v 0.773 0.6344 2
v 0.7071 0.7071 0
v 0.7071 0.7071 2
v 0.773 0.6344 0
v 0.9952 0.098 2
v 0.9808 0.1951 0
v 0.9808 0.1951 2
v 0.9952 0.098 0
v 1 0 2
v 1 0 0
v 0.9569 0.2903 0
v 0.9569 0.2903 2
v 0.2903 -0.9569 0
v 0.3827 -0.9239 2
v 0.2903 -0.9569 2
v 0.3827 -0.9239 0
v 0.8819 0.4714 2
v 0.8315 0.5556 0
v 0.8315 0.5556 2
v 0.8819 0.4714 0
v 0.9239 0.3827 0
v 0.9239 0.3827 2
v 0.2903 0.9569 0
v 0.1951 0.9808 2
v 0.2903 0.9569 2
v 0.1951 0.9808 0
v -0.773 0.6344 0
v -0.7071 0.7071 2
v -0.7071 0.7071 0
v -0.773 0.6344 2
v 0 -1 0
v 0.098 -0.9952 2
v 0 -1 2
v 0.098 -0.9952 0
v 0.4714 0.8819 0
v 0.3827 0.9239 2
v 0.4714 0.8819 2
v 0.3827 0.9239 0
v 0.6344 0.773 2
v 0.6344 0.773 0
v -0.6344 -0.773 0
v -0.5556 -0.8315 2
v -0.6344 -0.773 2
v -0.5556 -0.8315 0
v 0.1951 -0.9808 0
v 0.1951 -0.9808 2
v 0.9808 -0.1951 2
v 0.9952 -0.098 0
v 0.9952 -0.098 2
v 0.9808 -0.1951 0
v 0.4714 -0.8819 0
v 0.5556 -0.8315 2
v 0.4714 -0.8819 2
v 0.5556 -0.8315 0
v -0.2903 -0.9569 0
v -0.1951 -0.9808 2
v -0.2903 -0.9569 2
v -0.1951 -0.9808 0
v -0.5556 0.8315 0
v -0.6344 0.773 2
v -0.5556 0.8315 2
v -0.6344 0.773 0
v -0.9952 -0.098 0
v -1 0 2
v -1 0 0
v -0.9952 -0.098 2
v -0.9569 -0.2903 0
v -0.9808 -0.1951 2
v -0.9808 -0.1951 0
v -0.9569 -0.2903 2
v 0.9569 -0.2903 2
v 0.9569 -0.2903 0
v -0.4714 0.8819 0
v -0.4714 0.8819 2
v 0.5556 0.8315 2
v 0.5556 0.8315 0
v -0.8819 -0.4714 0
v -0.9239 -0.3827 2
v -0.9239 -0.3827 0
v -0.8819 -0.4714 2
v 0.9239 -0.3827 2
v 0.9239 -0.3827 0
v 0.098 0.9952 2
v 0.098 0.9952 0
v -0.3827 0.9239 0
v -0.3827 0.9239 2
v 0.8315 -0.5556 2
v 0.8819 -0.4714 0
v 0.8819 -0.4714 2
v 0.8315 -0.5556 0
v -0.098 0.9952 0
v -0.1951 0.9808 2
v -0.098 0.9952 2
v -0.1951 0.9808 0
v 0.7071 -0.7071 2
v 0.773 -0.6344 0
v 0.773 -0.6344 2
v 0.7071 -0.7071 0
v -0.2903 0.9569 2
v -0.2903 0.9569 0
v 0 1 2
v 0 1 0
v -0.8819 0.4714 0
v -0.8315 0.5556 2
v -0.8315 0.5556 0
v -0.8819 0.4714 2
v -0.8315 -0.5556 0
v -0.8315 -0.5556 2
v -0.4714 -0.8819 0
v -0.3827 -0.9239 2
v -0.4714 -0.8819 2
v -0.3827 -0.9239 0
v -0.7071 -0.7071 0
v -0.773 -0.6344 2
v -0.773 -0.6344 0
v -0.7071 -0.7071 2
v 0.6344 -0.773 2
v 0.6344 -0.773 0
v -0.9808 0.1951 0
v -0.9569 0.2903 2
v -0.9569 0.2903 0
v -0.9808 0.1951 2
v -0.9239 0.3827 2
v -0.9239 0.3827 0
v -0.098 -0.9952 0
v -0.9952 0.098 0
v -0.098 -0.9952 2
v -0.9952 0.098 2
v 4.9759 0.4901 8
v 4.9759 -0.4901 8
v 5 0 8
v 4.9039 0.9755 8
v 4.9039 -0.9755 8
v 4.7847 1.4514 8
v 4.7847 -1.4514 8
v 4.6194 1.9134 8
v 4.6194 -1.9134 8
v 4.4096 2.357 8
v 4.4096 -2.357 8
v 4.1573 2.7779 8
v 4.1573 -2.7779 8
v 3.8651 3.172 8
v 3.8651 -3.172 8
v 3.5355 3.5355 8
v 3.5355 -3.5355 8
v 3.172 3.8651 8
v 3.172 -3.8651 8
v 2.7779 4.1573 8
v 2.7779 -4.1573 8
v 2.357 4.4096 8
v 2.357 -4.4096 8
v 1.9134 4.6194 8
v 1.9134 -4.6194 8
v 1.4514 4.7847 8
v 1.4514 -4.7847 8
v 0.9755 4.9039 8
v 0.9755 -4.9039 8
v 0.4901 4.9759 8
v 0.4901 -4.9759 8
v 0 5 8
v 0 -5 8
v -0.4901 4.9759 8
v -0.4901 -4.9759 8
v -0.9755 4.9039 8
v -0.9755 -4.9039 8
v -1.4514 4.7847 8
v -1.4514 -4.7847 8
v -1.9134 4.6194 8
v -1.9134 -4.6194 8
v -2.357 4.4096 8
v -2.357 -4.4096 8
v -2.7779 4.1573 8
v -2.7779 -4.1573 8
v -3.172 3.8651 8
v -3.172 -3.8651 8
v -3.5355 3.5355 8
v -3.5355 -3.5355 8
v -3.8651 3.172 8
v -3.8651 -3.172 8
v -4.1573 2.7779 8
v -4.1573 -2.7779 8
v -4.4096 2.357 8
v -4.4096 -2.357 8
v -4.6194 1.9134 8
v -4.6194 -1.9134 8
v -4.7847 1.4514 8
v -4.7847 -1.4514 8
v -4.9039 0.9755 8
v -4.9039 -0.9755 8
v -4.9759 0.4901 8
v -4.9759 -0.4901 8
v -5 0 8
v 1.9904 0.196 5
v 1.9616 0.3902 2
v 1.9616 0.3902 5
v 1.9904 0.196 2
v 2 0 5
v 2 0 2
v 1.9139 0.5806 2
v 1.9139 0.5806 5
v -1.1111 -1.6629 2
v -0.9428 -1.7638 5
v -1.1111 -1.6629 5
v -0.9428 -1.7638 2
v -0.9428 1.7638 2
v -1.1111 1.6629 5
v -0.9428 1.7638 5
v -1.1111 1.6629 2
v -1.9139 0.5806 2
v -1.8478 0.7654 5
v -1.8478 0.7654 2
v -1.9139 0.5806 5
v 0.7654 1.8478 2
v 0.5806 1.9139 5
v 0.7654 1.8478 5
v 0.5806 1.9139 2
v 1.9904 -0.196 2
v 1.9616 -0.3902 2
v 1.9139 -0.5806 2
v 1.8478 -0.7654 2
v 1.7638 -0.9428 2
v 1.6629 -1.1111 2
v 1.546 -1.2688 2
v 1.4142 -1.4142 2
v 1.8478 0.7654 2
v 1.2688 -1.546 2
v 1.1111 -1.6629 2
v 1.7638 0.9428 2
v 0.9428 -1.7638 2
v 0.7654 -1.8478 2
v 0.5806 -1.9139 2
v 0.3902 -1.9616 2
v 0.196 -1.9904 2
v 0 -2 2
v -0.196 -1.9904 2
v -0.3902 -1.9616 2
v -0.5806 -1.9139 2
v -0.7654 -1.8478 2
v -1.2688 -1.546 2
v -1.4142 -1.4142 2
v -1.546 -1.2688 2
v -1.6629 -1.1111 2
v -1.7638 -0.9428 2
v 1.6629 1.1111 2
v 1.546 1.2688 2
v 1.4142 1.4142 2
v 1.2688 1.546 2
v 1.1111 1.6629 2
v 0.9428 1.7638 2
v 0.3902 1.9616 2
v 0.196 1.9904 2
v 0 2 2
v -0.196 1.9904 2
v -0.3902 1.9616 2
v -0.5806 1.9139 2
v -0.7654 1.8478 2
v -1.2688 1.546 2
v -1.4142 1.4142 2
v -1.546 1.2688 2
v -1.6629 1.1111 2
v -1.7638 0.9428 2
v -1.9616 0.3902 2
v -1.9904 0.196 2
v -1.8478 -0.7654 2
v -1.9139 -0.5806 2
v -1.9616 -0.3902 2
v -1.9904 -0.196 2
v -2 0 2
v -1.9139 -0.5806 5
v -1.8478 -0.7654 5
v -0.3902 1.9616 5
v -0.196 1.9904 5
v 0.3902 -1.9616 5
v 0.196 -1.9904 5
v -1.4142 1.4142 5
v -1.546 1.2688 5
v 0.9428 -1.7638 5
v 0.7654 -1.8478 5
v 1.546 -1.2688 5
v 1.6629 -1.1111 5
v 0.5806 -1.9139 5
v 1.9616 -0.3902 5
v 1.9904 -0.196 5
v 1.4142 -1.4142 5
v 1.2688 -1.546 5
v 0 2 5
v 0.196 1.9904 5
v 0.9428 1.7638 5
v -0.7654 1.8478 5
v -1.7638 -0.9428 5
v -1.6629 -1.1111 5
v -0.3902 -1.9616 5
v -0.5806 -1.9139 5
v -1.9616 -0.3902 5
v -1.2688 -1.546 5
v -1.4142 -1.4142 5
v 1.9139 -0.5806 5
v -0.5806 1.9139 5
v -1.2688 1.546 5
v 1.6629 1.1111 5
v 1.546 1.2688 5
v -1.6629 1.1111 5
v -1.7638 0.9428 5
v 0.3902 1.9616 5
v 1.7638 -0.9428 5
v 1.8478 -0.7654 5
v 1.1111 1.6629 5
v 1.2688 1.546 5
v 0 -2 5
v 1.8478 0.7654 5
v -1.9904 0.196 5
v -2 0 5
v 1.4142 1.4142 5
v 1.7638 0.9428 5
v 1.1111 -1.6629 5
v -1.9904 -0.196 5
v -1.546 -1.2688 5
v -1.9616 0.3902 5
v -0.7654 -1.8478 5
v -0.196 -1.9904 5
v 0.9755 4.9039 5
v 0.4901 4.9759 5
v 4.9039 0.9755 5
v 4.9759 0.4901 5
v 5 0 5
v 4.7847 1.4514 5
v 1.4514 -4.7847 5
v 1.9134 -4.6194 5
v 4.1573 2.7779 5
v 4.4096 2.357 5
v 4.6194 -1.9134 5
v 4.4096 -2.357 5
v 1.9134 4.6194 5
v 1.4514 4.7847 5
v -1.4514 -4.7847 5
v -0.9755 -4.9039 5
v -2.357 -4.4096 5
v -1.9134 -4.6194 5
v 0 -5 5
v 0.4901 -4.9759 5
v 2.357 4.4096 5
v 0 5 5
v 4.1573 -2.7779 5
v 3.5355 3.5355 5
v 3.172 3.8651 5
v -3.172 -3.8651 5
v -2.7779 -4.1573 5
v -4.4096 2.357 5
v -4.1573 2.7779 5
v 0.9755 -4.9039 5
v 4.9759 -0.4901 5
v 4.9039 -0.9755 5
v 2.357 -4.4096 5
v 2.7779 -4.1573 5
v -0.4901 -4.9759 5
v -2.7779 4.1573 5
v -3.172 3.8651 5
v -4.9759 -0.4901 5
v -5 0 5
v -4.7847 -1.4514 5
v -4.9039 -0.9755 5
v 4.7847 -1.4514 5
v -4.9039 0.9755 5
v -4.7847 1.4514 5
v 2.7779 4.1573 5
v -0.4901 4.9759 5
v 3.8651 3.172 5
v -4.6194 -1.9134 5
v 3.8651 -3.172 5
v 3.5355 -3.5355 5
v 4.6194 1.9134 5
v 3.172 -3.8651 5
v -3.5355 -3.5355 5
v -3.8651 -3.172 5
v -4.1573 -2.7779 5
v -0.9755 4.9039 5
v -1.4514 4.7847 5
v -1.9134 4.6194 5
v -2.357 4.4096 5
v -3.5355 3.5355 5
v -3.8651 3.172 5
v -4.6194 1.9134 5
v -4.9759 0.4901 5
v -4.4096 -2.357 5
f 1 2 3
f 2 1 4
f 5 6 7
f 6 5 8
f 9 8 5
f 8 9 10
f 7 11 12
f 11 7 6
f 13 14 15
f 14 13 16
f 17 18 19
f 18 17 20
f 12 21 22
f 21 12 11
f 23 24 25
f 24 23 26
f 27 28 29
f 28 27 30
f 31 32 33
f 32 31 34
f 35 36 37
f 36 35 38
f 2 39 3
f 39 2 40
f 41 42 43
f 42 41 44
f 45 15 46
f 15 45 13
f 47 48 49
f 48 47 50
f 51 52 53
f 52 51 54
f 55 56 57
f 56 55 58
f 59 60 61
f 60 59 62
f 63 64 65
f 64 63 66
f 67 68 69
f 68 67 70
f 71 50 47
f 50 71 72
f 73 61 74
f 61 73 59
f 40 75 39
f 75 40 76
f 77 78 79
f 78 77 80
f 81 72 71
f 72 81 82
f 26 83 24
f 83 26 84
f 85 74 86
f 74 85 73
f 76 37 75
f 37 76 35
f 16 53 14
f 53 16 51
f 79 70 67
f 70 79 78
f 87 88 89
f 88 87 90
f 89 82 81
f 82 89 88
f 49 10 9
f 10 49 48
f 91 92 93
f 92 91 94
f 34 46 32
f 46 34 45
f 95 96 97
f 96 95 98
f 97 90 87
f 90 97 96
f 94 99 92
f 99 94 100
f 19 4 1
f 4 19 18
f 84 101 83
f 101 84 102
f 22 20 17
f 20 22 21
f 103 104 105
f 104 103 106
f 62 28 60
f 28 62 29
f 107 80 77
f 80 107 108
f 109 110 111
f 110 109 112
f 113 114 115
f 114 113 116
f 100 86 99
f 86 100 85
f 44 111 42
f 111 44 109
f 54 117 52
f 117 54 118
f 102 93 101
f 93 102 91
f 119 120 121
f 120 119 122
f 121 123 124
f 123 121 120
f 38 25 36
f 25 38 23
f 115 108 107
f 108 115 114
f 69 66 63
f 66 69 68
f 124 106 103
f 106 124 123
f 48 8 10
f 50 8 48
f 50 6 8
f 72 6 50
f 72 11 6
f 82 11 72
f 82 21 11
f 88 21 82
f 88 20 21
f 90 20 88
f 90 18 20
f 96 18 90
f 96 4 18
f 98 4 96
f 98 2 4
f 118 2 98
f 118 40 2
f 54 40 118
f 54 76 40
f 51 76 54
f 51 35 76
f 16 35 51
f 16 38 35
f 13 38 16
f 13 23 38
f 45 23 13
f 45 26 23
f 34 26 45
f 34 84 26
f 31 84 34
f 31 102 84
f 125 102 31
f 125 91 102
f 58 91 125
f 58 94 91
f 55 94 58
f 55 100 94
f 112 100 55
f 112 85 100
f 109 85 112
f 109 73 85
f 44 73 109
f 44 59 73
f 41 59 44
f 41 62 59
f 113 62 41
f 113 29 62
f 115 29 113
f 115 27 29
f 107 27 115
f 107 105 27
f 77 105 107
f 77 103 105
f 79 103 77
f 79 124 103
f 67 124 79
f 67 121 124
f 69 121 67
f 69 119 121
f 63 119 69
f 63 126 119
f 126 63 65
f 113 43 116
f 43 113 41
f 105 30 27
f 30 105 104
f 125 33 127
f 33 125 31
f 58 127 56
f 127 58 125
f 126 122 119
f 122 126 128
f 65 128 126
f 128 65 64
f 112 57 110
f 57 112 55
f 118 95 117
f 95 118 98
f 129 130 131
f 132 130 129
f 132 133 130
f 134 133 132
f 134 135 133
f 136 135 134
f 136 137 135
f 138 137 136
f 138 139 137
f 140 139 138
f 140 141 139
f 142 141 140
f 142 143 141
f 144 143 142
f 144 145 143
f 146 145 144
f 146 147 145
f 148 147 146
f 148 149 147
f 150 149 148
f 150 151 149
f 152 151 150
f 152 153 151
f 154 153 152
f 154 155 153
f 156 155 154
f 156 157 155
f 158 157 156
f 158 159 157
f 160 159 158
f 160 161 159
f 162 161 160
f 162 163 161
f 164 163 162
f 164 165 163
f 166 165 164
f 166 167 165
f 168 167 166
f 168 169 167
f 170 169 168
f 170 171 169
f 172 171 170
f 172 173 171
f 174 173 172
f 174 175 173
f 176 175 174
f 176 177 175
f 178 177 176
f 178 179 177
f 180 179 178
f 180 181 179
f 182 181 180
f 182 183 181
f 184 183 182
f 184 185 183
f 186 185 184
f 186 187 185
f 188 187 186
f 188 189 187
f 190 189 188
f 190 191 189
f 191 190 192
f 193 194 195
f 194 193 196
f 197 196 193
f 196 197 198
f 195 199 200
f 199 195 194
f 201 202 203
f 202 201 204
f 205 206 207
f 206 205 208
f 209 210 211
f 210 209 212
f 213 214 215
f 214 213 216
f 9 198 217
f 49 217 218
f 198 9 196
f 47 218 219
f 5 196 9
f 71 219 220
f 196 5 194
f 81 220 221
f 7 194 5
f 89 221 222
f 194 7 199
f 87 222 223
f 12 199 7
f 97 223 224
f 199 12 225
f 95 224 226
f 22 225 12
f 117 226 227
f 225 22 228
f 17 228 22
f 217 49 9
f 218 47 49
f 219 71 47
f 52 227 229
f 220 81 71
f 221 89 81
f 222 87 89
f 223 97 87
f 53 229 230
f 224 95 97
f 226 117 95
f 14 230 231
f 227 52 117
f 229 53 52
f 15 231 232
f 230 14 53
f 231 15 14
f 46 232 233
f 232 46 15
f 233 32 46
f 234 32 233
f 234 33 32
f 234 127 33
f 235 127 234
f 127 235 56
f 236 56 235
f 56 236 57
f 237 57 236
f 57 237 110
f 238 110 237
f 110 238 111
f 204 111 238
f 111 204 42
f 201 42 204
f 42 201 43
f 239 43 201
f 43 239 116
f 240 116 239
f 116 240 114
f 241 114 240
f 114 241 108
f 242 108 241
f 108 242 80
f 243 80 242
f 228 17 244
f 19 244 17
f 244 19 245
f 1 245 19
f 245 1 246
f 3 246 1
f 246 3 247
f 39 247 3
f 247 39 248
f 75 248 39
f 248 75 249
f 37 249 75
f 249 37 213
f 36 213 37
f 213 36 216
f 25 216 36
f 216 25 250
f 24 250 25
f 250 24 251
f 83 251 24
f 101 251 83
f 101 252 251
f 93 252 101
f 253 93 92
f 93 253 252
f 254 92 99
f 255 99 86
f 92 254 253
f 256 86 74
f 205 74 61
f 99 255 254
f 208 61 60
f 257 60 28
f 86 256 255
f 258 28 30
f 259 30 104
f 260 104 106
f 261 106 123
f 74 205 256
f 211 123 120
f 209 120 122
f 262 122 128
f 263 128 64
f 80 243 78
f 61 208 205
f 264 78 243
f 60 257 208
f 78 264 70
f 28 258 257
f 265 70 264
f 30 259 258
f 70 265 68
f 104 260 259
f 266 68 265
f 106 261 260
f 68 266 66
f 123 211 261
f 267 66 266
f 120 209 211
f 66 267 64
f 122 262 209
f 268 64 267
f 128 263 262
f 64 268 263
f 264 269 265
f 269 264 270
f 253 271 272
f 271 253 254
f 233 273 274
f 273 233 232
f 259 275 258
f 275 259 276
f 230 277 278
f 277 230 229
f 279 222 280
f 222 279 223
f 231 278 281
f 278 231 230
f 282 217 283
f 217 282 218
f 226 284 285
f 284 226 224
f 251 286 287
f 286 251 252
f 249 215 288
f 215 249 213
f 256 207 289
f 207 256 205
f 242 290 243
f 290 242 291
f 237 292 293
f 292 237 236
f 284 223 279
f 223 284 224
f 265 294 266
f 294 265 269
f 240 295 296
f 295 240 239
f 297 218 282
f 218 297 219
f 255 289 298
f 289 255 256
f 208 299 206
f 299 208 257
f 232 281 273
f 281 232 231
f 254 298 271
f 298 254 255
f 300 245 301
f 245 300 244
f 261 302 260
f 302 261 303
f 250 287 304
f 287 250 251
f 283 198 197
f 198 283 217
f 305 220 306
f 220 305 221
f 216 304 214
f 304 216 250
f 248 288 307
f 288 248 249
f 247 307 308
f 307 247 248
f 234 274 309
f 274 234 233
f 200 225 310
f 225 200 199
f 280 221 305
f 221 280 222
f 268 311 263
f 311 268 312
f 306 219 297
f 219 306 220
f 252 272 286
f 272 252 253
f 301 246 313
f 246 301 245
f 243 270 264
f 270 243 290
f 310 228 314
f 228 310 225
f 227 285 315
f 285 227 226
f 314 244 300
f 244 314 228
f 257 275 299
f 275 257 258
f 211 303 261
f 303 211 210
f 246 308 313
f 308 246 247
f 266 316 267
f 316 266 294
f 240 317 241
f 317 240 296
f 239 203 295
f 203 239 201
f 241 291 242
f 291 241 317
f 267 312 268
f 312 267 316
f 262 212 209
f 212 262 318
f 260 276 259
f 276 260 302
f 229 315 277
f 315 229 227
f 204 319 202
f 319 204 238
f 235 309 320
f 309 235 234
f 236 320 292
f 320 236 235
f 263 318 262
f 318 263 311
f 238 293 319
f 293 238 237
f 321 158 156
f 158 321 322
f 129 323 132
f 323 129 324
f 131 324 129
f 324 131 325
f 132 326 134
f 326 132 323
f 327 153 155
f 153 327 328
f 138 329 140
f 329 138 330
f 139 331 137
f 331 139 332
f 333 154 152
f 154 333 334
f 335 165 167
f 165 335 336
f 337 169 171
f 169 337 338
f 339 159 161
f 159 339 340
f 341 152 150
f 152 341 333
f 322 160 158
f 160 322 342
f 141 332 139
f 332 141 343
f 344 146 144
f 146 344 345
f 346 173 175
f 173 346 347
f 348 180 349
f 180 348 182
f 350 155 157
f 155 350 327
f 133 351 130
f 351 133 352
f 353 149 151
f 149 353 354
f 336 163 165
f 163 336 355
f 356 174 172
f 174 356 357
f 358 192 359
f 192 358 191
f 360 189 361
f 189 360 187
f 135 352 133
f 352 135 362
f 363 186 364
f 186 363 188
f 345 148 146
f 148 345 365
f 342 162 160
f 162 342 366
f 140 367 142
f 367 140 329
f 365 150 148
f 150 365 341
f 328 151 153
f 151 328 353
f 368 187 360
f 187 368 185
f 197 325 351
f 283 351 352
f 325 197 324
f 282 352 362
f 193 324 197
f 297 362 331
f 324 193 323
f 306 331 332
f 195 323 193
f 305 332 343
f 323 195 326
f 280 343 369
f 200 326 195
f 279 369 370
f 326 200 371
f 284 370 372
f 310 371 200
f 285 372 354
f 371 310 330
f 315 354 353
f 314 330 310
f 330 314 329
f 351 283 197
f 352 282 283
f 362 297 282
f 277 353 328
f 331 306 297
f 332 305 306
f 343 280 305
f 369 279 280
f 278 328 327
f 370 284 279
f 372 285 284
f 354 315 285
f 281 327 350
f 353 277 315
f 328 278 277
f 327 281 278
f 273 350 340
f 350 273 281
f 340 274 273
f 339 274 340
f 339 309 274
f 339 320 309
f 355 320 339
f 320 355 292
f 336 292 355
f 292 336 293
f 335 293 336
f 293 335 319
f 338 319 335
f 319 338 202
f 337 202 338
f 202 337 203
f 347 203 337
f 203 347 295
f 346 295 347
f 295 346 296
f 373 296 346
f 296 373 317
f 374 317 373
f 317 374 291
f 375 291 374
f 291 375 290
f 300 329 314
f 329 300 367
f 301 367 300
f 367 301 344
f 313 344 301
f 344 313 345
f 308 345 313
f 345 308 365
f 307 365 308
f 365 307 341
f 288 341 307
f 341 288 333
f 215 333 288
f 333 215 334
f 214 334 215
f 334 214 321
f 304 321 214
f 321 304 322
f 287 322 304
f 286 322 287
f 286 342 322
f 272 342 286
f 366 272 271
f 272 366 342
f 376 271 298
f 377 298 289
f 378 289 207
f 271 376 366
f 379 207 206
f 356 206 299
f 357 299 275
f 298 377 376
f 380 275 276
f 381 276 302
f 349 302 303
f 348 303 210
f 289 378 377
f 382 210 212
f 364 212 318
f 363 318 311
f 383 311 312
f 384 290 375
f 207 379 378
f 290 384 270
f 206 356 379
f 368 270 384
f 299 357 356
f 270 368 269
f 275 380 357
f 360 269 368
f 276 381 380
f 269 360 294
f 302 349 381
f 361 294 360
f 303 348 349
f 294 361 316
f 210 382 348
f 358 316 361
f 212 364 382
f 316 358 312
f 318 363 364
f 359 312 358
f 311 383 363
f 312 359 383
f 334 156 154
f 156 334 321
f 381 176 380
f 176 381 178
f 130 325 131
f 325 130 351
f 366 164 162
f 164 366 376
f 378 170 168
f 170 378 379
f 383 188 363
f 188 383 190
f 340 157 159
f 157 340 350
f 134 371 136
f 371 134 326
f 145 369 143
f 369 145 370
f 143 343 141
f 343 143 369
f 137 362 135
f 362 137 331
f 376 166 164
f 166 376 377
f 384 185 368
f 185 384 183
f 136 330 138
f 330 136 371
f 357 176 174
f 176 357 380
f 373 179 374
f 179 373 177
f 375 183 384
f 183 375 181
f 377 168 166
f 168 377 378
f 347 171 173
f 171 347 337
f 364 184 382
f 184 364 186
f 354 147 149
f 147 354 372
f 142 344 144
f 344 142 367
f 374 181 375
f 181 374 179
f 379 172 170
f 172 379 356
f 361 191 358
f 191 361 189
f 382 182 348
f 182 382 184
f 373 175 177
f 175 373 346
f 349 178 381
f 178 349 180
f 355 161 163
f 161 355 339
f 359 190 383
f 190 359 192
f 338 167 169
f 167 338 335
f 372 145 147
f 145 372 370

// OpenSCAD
// file: lib.scad
module back(wire_diameter, net_gap, pin_diameter, back_thickness) {
  width = 5;
  module vertical() {
    linear_extrude(width) {
      difference() {
        circle(d = wire_diameter + 2 * back_thickness);
        circle(d = wire_diameter);
        translate([- wire_diameter / 2 - back_thickness, 0])
          square([wire_diameter + 2 * back_thickness, wire_diameter / 2 + back_thickness]);
      }
      translate([wire_diameter / 2, 0])
        square([back_thickness, net_gap + 3]);
      translate([- wire_diameter / 2 - back_thickness, 0])
        square([back_thickness, 3]);
    }
  }
  module half() {
    translate([0, 0, 10]) vertical();
    translate([wire_diameter / 2, 2, 0]) {
      difference() {
        cube([back_thickness, width, 10]);
        translate([0, width / 2, 0])
          rotate([90, 0, 90]) {
            cylinder(d = pin_diameter + 0.3, h = back_thickness);
            translate([- 0.2 / 2, - pin_diameter * 1.4 / 2, 0])
              cube([0.2, pin_diameter * 1.4, back_thickness]);
          }
      }
    }
    translate([wire_diameter / 2, net_gap + 3 - width, 0]) cube([back_thickness, width, 10]);
  }
  half();
  mirror([0, 0, 1]) half();
}

module hook(outer_hole_diameter, inner_hole_diameter, pin_diameter, back_thickness, plate_thickness) {
  cylinder(d = pin_diameter, h = back_thickness + plate_thickness + 3);
  translate([0, 0, back_thickness]) cylinder(d = inner_hole_diameter, h = plate_thickness + 3);
  translate([0, 0, back_thickness + plate_thickness]) cylinder(d = outer_hole_diameter, h = 3);
}
// main file
$fn = $preview ? 16 : 64;

include <lib.scad>

outer_hole_diameter = 10;
inner_hole_diameter = 4;
wire_diameter = 2.7;
net_gap = 37;
pin_diameter = 2;
back_thickness = 2;
plate_thickness = 3;

// back(wire_diameter, net_gap, pin_diameter, back_thickness);

hook(outer_hole_diameter, inner_hole_diameter, pin_diameter, back_thickness, plate_thickness);
